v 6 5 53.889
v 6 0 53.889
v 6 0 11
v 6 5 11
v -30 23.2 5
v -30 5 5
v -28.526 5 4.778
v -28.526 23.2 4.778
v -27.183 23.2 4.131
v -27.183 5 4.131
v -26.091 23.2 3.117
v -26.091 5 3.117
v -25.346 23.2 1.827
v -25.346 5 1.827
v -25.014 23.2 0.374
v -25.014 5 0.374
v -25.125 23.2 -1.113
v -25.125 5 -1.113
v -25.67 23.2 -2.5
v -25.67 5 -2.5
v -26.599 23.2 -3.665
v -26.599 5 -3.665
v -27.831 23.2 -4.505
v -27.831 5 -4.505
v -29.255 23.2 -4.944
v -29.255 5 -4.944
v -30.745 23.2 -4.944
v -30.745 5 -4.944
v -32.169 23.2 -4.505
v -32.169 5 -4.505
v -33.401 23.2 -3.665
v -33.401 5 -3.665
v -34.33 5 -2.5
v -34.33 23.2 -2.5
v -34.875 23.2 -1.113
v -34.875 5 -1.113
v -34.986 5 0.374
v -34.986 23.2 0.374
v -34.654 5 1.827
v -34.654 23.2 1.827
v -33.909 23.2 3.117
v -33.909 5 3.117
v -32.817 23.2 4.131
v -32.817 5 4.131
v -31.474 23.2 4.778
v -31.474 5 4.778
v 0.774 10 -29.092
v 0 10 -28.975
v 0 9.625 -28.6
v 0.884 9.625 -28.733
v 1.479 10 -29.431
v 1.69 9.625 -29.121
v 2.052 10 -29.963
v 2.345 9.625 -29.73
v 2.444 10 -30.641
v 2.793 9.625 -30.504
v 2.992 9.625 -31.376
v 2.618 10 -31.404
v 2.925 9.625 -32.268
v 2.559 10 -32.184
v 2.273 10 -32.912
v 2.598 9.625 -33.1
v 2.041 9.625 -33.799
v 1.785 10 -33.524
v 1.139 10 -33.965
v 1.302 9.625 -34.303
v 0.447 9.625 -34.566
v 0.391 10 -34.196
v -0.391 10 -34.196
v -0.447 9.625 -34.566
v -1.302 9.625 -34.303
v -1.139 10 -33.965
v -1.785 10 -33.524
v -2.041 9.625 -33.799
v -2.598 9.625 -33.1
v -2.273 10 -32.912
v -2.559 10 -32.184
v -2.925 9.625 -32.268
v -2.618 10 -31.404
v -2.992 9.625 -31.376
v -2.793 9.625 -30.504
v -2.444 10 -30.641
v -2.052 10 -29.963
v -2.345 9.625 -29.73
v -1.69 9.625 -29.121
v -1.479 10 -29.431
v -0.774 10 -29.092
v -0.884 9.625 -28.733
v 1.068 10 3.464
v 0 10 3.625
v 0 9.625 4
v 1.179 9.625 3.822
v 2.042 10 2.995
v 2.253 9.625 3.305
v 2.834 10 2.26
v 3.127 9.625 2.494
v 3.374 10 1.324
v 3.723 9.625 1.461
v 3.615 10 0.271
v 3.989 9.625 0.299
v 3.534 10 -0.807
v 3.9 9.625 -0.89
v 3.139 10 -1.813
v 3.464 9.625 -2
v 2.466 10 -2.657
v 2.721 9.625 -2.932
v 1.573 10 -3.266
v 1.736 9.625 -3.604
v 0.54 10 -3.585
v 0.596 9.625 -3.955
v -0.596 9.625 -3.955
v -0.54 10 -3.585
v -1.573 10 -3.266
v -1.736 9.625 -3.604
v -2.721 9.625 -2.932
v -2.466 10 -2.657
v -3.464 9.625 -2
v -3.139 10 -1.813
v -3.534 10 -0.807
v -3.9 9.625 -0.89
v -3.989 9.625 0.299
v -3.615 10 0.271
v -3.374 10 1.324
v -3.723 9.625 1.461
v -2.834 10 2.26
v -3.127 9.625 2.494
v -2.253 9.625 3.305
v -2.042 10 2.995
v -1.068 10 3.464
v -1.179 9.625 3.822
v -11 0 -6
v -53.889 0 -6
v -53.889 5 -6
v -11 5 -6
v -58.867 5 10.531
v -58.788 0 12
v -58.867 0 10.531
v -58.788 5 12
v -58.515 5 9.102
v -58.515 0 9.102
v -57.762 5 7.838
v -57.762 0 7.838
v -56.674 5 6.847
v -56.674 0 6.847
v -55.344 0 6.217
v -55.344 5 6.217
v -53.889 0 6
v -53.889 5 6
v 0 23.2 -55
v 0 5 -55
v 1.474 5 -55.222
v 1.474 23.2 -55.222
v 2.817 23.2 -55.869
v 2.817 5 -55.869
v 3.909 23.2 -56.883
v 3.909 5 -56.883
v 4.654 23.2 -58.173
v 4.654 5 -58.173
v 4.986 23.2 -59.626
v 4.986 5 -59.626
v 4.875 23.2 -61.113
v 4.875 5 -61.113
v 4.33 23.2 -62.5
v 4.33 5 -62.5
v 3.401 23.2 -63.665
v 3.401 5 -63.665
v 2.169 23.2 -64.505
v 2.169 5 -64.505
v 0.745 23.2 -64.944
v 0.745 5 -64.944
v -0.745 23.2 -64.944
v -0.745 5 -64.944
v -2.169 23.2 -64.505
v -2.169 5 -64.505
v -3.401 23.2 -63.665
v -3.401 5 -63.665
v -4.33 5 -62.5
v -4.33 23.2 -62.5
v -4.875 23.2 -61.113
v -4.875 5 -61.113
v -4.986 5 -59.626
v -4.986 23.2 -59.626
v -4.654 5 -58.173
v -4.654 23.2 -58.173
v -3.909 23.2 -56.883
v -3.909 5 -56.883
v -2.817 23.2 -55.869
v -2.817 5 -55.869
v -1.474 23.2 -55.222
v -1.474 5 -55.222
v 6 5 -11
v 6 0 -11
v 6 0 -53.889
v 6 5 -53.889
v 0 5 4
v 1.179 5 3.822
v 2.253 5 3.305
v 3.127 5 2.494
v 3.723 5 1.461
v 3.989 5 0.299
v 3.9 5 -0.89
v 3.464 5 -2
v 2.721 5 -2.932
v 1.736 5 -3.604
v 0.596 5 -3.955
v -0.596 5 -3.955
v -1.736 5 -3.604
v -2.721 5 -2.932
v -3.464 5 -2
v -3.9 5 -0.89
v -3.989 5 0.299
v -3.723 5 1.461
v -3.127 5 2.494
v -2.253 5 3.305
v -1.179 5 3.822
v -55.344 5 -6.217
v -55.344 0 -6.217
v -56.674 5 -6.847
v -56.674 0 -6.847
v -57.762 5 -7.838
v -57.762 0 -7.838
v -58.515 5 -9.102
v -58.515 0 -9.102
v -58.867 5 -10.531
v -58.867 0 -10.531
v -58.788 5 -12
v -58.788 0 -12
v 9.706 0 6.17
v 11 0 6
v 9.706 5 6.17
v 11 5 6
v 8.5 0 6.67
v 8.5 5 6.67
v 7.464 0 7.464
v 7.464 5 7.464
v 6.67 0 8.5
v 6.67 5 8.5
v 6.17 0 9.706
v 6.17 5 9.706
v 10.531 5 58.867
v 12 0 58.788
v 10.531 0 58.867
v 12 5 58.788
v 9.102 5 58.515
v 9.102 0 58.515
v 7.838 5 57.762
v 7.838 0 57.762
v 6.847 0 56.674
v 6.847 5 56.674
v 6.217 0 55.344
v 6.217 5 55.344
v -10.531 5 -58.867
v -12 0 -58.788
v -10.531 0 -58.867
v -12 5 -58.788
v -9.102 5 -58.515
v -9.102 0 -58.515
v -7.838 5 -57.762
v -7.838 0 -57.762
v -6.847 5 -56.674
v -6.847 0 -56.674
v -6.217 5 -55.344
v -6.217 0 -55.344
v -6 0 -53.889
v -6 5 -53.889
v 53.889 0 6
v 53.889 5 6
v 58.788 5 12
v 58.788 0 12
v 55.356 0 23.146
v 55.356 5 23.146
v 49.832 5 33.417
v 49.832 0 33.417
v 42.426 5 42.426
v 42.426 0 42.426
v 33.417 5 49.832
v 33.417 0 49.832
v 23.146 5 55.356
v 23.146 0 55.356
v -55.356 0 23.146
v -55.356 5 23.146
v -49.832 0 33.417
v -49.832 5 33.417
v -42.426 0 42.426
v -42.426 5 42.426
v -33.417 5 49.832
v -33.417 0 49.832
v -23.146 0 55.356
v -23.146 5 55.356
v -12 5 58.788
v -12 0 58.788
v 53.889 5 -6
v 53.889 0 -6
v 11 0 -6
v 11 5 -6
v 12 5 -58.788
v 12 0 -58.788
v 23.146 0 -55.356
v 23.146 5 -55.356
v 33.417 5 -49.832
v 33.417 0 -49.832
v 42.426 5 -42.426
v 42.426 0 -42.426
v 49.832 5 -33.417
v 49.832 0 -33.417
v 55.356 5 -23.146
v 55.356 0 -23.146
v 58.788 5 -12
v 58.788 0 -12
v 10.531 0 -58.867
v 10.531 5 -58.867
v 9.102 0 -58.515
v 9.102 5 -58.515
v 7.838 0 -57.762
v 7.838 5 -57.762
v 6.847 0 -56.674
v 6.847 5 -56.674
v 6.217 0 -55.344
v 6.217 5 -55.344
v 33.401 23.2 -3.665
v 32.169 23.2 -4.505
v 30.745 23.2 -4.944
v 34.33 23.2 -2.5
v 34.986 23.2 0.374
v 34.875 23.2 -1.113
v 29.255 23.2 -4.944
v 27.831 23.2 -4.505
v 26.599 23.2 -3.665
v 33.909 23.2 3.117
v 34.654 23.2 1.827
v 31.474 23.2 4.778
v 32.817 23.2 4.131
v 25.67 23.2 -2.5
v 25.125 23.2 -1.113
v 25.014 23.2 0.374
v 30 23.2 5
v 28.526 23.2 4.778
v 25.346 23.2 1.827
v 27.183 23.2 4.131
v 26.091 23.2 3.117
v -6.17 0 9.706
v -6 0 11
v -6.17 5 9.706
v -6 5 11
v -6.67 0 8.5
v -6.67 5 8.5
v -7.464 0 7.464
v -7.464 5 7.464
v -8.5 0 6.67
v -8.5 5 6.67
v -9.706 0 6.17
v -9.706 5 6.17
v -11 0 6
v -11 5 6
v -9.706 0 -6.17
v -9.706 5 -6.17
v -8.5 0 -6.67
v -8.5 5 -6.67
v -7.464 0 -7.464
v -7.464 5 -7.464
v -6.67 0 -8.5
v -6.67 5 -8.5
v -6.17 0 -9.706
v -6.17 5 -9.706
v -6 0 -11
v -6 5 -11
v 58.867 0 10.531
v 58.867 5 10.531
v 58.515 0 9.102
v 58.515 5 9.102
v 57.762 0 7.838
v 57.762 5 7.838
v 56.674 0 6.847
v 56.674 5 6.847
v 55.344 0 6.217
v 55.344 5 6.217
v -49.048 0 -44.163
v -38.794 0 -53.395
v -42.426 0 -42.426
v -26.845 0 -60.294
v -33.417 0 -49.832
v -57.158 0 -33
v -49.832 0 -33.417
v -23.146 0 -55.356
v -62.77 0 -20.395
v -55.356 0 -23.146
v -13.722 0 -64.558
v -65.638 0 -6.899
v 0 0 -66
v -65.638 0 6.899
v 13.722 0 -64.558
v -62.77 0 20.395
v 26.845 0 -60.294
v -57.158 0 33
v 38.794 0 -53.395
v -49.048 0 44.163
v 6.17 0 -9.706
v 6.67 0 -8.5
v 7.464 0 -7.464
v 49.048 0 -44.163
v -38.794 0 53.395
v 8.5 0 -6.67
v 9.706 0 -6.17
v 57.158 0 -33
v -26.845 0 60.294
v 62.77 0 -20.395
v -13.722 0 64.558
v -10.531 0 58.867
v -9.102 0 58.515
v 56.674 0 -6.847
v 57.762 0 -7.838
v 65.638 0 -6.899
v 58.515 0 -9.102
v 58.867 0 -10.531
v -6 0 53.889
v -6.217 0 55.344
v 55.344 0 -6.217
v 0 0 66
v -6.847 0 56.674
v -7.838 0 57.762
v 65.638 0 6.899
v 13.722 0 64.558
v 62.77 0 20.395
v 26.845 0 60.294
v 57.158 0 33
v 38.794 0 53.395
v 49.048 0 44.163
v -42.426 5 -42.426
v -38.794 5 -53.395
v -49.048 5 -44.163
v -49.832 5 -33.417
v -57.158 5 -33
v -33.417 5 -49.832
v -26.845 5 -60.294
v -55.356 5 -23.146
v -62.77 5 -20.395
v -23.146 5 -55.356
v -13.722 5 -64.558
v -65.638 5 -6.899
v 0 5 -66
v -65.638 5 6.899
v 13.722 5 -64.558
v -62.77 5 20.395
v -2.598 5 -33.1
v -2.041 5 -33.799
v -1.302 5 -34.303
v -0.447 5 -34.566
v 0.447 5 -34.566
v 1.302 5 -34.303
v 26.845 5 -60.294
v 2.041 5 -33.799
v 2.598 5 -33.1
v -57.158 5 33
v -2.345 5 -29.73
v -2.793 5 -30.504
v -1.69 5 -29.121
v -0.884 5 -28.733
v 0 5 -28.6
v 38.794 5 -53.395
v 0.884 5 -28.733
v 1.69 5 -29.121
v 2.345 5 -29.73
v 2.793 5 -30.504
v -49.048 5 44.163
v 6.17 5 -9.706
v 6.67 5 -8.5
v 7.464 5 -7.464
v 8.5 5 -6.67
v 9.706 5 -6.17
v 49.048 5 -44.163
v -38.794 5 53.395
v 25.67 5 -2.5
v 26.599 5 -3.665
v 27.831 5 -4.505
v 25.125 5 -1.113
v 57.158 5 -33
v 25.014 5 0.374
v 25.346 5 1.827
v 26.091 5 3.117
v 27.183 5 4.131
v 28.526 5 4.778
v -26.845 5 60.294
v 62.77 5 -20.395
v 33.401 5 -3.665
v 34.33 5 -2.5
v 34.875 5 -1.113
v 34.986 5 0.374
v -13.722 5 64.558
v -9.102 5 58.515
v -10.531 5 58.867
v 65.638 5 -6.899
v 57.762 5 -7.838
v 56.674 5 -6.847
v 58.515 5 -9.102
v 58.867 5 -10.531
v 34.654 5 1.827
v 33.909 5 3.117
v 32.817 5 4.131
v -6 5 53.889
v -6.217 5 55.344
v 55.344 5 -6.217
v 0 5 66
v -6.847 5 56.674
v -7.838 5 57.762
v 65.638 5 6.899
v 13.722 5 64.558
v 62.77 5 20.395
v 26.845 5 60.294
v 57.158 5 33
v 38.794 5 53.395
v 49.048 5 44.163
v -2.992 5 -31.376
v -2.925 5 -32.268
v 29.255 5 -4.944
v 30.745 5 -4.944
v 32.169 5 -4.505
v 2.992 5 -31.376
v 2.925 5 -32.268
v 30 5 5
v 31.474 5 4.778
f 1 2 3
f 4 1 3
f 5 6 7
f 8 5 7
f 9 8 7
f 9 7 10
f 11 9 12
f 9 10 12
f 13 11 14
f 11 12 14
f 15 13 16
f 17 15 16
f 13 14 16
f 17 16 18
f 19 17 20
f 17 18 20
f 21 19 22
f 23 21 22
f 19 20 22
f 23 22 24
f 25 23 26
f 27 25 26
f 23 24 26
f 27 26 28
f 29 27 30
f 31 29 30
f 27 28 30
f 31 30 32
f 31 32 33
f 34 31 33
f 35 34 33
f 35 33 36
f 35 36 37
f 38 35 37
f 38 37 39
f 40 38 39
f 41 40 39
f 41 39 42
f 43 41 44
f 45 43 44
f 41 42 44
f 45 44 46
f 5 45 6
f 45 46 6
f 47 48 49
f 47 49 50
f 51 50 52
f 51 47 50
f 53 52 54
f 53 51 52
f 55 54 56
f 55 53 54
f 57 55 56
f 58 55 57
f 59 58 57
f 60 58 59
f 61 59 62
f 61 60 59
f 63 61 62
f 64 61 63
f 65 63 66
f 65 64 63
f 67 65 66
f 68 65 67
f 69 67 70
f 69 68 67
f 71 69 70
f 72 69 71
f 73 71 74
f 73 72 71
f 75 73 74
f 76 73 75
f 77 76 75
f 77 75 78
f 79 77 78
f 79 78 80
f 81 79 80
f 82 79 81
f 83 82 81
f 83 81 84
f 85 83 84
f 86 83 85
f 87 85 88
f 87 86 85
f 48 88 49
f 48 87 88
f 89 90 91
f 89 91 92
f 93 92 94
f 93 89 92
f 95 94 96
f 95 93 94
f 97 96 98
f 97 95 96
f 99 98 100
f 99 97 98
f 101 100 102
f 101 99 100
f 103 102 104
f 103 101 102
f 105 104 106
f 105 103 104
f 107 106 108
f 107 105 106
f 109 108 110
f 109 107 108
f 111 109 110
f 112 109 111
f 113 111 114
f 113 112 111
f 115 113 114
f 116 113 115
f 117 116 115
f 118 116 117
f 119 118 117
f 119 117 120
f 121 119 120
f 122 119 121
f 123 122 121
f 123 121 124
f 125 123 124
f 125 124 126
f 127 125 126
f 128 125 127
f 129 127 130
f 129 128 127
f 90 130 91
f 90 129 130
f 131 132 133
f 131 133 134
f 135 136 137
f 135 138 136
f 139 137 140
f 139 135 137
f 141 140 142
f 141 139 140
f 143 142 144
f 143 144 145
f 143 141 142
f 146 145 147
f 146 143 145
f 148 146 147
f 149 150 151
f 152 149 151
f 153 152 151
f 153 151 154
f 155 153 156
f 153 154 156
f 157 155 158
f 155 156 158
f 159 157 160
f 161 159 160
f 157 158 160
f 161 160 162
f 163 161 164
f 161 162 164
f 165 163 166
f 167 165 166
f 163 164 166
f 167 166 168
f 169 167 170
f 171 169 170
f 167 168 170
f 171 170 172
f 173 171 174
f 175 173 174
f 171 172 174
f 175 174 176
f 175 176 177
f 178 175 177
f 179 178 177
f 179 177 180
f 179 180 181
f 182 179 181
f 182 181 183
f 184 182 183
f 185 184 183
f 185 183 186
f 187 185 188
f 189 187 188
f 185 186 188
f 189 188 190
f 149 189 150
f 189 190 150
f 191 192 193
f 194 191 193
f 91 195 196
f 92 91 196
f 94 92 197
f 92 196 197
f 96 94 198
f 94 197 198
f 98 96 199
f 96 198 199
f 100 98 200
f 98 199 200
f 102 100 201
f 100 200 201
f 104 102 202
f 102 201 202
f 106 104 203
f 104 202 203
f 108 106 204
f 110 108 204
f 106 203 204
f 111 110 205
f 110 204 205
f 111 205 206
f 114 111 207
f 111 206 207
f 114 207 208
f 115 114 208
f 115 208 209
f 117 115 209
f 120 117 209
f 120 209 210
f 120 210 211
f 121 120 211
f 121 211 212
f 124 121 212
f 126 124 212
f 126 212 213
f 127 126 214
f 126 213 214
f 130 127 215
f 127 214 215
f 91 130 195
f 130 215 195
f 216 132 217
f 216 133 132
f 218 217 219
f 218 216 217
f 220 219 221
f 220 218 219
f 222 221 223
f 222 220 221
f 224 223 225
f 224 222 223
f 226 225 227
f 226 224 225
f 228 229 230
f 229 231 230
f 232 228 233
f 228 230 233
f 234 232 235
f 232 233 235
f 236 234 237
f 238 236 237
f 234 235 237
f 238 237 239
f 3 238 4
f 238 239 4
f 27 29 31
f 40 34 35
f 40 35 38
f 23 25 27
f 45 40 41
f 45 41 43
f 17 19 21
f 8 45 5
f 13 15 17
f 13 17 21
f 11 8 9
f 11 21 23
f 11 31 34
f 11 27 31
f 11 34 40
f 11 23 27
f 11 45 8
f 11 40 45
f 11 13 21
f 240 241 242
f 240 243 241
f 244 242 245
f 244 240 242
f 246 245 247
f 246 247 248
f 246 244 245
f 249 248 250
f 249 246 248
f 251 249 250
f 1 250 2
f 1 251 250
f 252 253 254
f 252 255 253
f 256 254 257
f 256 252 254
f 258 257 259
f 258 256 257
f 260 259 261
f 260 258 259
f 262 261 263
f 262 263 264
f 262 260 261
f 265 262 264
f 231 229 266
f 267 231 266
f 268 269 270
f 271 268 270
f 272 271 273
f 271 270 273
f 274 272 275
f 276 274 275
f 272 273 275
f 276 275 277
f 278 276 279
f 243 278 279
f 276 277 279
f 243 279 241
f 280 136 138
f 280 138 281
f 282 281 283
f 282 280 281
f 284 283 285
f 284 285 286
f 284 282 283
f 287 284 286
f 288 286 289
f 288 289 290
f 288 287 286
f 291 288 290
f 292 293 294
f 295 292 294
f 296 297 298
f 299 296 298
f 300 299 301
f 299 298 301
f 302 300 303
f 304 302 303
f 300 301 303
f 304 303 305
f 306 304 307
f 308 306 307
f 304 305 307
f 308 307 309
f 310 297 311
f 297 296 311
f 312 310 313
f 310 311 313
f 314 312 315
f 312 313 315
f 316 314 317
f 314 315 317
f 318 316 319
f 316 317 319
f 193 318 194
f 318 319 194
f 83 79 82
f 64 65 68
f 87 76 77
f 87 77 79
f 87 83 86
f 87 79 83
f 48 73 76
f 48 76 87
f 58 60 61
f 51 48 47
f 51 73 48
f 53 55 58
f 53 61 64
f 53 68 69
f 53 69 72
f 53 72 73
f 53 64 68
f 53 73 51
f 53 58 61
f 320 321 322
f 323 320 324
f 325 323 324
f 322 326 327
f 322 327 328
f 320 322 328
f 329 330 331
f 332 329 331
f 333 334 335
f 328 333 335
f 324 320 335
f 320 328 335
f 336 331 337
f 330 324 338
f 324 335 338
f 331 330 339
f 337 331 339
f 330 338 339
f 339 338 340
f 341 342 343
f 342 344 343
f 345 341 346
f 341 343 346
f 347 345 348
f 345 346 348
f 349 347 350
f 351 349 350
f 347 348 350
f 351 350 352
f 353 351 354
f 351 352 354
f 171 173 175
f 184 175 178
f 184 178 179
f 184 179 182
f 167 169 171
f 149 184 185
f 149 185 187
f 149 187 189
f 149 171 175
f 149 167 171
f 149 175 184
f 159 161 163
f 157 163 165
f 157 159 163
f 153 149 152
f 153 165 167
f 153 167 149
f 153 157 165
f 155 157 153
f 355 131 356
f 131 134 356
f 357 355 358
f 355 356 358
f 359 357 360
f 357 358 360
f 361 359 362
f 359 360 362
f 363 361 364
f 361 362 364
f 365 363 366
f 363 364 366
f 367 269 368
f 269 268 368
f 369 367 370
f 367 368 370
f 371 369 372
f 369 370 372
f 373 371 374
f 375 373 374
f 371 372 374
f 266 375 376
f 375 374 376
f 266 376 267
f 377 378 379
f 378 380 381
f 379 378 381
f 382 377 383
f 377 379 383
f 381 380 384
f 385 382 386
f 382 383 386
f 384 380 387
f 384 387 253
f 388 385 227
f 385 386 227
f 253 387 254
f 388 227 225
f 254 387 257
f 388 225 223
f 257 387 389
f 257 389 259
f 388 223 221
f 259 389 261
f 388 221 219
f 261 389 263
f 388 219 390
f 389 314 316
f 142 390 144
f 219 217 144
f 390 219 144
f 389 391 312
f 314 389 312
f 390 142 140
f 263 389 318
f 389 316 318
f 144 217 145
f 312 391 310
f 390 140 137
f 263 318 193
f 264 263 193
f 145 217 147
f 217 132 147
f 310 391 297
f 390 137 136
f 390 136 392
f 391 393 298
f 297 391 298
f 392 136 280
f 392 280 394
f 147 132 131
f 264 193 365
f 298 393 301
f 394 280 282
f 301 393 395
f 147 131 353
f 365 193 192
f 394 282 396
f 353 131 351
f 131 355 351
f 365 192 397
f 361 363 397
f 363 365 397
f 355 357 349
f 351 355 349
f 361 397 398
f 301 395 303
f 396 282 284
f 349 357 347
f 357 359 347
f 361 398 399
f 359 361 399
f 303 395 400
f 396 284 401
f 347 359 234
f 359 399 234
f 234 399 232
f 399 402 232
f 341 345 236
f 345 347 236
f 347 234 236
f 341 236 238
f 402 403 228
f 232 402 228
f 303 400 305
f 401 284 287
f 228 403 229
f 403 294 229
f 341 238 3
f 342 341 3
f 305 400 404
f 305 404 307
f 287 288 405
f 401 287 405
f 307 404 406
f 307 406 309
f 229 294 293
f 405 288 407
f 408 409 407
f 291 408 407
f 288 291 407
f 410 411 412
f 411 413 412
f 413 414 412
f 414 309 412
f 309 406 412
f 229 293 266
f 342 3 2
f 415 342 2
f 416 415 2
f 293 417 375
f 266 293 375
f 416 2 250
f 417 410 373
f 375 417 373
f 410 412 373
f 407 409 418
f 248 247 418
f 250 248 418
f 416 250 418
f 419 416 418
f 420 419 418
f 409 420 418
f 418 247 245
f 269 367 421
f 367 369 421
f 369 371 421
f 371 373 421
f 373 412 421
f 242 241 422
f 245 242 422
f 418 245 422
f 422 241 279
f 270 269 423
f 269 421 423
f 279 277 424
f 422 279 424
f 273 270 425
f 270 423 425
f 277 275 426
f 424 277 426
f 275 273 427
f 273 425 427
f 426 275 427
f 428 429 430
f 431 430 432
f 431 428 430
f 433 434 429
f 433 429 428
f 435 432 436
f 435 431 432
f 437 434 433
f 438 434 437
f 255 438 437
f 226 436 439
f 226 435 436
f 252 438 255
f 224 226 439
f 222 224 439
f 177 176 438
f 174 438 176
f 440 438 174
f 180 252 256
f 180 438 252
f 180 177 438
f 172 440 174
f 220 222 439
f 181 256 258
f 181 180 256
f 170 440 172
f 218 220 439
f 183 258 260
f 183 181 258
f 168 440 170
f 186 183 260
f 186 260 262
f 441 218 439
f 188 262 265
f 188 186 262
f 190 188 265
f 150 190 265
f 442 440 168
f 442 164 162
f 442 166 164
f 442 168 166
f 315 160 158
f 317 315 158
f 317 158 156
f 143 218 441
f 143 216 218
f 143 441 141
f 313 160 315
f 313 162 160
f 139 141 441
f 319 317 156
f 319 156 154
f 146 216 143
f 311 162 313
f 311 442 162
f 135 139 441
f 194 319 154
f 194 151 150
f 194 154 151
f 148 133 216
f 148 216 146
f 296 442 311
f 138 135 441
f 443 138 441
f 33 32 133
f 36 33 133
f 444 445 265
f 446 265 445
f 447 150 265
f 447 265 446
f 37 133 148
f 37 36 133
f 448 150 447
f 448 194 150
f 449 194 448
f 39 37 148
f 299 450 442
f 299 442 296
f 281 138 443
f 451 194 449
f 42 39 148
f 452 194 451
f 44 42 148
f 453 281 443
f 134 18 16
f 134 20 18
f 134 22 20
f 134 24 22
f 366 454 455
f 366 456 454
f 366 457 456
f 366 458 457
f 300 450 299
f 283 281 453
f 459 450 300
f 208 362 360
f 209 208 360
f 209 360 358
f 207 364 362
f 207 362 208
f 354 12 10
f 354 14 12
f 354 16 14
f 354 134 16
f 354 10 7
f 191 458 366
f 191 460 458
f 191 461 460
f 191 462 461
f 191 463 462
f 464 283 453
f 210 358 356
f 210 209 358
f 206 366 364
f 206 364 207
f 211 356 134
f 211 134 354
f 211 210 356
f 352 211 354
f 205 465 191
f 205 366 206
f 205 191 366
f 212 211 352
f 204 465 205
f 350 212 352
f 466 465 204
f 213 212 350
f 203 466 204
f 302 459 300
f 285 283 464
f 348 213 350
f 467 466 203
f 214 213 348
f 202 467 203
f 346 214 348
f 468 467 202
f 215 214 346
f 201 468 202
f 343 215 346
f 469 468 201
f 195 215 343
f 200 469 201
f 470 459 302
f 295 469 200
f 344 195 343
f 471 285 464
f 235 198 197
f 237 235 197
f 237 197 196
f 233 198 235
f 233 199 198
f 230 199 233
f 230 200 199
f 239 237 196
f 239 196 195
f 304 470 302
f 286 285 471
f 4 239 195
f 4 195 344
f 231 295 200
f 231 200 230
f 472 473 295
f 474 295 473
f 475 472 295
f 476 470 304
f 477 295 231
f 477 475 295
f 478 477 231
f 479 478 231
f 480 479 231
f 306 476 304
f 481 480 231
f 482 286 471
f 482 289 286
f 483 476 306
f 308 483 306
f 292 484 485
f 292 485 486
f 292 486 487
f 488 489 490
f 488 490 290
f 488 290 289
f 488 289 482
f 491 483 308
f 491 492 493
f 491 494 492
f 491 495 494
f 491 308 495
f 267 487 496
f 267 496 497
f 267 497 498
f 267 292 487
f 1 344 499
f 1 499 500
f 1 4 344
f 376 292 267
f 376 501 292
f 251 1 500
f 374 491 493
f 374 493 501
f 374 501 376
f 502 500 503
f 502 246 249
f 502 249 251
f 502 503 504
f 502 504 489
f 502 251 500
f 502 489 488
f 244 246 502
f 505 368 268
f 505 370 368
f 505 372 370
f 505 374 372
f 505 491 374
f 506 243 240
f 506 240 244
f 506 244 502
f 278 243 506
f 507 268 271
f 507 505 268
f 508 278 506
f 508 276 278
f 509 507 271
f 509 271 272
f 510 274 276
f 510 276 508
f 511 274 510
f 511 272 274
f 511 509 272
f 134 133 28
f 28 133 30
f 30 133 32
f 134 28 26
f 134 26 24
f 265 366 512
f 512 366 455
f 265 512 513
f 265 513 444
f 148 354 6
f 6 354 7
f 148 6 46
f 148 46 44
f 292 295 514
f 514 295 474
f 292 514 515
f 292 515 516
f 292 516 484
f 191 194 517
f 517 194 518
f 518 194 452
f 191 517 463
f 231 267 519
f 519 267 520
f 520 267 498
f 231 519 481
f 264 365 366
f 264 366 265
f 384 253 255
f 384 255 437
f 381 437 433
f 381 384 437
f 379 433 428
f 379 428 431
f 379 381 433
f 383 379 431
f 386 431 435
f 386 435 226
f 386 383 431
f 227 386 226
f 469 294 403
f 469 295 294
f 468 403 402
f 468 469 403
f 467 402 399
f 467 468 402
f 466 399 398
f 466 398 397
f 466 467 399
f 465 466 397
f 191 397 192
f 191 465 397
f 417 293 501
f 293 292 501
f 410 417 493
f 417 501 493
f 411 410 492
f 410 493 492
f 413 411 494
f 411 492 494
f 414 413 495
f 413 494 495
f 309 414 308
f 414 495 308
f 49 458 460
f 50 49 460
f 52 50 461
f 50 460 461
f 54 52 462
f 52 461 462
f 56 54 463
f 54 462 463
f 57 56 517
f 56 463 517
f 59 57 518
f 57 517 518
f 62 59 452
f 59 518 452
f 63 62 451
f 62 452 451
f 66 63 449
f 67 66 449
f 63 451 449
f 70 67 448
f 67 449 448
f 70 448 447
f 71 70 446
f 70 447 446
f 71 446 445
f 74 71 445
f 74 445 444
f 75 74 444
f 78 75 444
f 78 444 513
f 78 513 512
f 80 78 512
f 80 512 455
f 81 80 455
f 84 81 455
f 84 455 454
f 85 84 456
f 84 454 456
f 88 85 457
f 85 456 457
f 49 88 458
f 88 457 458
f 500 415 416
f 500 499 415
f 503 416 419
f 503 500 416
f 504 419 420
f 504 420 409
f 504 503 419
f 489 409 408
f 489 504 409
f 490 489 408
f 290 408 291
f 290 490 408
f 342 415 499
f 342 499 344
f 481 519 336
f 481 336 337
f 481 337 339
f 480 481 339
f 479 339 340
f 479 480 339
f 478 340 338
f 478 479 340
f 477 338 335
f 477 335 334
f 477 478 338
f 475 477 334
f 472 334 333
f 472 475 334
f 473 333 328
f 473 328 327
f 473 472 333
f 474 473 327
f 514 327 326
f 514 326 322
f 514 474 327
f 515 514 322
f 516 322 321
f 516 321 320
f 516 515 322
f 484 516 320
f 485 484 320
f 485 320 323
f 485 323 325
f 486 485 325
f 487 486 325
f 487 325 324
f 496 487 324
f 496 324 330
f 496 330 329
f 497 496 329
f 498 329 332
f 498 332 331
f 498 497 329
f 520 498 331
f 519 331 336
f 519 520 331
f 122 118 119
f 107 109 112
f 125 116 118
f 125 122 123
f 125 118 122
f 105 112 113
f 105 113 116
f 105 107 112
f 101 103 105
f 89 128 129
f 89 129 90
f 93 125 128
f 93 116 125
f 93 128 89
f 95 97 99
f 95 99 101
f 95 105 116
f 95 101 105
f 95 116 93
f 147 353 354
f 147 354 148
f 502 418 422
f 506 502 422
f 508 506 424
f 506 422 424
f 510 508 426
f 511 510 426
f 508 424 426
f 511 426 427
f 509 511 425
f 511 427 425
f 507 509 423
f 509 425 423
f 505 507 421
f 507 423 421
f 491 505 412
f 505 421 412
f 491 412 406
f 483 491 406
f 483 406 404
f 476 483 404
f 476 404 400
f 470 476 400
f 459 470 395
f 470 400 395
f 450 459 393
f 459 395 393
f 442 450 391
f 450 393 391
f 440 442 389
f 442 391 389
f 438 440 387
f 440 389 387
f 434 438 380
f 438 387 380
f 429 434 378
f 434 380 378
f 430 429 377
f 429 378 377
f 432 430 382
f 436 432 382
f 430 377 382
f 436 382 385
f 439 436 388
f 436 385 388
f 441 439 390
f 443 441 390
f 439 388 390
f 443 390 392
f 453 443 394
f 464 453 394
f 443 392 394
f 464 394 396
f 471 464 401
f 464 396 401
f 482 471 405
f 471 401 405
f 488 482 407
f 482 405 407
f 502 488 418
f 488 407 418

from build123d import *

# Parameters (mm, degrees)
SKETCH1_R           = 66
BOSS_EXTRUDE1_DEPTH = 5
FILLET1_R           = 5
SKETCH2_R           = 4
SKETCH2_R_2         = 3
BOSS_EXTRUDE2_DEPTH = 5
CHAMFER1_SIZE       = 0.375
SKETCH3_R           = 5
BOSS_EXTRUDE3_DEPTH = 18.2
SKETCH4_R           = 5
BOSS_EXTRUDE4_DEPTH = 18.2


with BuildPart() as part:
    # Sketch1 → Boss-Extrude1 (new body)
    with BuildSketch(Plane(origin=(0, 0, 0), x_dir=(1, 0, 0), z_dir=(0, 1, 0))):
        with Locations(Location((0, 0, 0), (0, 0, 270))):
            Circle(SKETCH1_R)
        with BuildLine():
            Line((-6, -59.699246226), (-6, -6))
            Line((-6, -6), (-59.699246226, -6))
            ThreePointArc((-59.699246226, -6), (-42.426406871, -42.426406871), (-6, -59.699246226))
        make_face(mode=Mode.SUBTRACT)
        with BuildLine():
            Line((6, -59.699246226), (6, -6))
            Line((6, -6), (59.699246226, -6))
            ThreePointArc((59.699246226, -6), (42.426406871, -42.426406871), (6, -59.699246226))
        make_face(mode=Mode.SUBTRACT)
        with BuildLine():
            Line((-59.699246226, 6), (-6, 6))
            Line((-6, 6), (-6, 59.699246226))
            ThreePointArc((-6, 59.699246226), (-42.426406871, 42.426406871), (-59.699246226, 6))
        make_face(mode=Mode.SUBTRACT)
        with BuildLine():
            Line((6, 6), (6, 59.699246226))
            ThreePointArc((6, 59.699246226), (42.426406871, 42.426406871), (59.699246226, 6))
            Line((59.699246226, 6), (6, 6))
        make_face(mode=Mode.SUBTRACT)
    extrude(amount=BOSS_EXTRUDE1_DEPTH)

    # Fillet1
    fillet1_edges = [part.edges().sort_by_distance(p)[0] for p in [
        (-6, 2.5, -59.699246226),
        (-59.699246226, 2.5, -6),
        (-6, 2.5, -6),
        (6, 2.5, 59.699246226),
        (59.699246226, 2.5, 6),
        (6, 2.5, 6),
        (59.699246226, 2.5, -6),
        (6, 2.5, -59.699246226),
        (6, 2.5, -6),
        (-59.699246226, 2.5, 6),
        (-6, 2.5, 59.699246226),
        (-6, 2.5, 6),
    ]]
    fillet(fillet1_edges, radius=FILLET1_R)

    # Sketch2 → Boss-Extrude2 (add)
    with BuildSketch(Plane(origin=(0, 5, 0), x_dir=(1, 0, 0), z_dir=(0, 1, 0))):
        with Locations(Location((0, 0, 0), (0, 0, 270))):
            Circle(SKETCH2_R)
        with Locations(Location((0, 31.6, 0), (0, 0, 270))):
            Circle(SKETCH2_R_2)
    extrude(amount=BOSS_EXTRUDE2_DEPTH)

    # Chamfer1
    chamfer1_edges = [part.edges().sort_by_distance(p)[0] for p in [
        (0, 10, -4),
        (0, 10, -34.6),
    ]]
    chamfer(chamfer1_edges, length=CHAMFER1_SIZE)

    # Sketch3 → Boss-Extrude3 (add)
    with BuildSketch(Plane(origin=(0, 5, 0), x_dir=(1, 0, 0), z_dir=(0, 1, 0))):
        with Locations(Location((-30, 0, 0), (0, 0, 270))):
            Circle(SKETCH3_R)
    boss_extrude3 = extrude(amount=BOSS_EXTRUDE3_DEPTH)

    # Mirror1: Boss-Extrude3 across plane
    add(boss_extrude3.mirror(Plane(origin=(0, 0, 0), x_dir=(0, 0, 1), z_dir=(1, 0, 0))))

    # Sketch4 → Boss-Extrude4 (add)
    with BuildSketch(Plane(origin=(0, 5, 0), x_dir=(1, 0, 0), z_dir=(0, 1, 0))):
        with Locations(Location((0, 60, 0), (0, 0, 270))):
            Circle(SKETCH4_R)
    extrude(amount=BOSS_EXTRUDE4_DEPTH)


solid = part.part
